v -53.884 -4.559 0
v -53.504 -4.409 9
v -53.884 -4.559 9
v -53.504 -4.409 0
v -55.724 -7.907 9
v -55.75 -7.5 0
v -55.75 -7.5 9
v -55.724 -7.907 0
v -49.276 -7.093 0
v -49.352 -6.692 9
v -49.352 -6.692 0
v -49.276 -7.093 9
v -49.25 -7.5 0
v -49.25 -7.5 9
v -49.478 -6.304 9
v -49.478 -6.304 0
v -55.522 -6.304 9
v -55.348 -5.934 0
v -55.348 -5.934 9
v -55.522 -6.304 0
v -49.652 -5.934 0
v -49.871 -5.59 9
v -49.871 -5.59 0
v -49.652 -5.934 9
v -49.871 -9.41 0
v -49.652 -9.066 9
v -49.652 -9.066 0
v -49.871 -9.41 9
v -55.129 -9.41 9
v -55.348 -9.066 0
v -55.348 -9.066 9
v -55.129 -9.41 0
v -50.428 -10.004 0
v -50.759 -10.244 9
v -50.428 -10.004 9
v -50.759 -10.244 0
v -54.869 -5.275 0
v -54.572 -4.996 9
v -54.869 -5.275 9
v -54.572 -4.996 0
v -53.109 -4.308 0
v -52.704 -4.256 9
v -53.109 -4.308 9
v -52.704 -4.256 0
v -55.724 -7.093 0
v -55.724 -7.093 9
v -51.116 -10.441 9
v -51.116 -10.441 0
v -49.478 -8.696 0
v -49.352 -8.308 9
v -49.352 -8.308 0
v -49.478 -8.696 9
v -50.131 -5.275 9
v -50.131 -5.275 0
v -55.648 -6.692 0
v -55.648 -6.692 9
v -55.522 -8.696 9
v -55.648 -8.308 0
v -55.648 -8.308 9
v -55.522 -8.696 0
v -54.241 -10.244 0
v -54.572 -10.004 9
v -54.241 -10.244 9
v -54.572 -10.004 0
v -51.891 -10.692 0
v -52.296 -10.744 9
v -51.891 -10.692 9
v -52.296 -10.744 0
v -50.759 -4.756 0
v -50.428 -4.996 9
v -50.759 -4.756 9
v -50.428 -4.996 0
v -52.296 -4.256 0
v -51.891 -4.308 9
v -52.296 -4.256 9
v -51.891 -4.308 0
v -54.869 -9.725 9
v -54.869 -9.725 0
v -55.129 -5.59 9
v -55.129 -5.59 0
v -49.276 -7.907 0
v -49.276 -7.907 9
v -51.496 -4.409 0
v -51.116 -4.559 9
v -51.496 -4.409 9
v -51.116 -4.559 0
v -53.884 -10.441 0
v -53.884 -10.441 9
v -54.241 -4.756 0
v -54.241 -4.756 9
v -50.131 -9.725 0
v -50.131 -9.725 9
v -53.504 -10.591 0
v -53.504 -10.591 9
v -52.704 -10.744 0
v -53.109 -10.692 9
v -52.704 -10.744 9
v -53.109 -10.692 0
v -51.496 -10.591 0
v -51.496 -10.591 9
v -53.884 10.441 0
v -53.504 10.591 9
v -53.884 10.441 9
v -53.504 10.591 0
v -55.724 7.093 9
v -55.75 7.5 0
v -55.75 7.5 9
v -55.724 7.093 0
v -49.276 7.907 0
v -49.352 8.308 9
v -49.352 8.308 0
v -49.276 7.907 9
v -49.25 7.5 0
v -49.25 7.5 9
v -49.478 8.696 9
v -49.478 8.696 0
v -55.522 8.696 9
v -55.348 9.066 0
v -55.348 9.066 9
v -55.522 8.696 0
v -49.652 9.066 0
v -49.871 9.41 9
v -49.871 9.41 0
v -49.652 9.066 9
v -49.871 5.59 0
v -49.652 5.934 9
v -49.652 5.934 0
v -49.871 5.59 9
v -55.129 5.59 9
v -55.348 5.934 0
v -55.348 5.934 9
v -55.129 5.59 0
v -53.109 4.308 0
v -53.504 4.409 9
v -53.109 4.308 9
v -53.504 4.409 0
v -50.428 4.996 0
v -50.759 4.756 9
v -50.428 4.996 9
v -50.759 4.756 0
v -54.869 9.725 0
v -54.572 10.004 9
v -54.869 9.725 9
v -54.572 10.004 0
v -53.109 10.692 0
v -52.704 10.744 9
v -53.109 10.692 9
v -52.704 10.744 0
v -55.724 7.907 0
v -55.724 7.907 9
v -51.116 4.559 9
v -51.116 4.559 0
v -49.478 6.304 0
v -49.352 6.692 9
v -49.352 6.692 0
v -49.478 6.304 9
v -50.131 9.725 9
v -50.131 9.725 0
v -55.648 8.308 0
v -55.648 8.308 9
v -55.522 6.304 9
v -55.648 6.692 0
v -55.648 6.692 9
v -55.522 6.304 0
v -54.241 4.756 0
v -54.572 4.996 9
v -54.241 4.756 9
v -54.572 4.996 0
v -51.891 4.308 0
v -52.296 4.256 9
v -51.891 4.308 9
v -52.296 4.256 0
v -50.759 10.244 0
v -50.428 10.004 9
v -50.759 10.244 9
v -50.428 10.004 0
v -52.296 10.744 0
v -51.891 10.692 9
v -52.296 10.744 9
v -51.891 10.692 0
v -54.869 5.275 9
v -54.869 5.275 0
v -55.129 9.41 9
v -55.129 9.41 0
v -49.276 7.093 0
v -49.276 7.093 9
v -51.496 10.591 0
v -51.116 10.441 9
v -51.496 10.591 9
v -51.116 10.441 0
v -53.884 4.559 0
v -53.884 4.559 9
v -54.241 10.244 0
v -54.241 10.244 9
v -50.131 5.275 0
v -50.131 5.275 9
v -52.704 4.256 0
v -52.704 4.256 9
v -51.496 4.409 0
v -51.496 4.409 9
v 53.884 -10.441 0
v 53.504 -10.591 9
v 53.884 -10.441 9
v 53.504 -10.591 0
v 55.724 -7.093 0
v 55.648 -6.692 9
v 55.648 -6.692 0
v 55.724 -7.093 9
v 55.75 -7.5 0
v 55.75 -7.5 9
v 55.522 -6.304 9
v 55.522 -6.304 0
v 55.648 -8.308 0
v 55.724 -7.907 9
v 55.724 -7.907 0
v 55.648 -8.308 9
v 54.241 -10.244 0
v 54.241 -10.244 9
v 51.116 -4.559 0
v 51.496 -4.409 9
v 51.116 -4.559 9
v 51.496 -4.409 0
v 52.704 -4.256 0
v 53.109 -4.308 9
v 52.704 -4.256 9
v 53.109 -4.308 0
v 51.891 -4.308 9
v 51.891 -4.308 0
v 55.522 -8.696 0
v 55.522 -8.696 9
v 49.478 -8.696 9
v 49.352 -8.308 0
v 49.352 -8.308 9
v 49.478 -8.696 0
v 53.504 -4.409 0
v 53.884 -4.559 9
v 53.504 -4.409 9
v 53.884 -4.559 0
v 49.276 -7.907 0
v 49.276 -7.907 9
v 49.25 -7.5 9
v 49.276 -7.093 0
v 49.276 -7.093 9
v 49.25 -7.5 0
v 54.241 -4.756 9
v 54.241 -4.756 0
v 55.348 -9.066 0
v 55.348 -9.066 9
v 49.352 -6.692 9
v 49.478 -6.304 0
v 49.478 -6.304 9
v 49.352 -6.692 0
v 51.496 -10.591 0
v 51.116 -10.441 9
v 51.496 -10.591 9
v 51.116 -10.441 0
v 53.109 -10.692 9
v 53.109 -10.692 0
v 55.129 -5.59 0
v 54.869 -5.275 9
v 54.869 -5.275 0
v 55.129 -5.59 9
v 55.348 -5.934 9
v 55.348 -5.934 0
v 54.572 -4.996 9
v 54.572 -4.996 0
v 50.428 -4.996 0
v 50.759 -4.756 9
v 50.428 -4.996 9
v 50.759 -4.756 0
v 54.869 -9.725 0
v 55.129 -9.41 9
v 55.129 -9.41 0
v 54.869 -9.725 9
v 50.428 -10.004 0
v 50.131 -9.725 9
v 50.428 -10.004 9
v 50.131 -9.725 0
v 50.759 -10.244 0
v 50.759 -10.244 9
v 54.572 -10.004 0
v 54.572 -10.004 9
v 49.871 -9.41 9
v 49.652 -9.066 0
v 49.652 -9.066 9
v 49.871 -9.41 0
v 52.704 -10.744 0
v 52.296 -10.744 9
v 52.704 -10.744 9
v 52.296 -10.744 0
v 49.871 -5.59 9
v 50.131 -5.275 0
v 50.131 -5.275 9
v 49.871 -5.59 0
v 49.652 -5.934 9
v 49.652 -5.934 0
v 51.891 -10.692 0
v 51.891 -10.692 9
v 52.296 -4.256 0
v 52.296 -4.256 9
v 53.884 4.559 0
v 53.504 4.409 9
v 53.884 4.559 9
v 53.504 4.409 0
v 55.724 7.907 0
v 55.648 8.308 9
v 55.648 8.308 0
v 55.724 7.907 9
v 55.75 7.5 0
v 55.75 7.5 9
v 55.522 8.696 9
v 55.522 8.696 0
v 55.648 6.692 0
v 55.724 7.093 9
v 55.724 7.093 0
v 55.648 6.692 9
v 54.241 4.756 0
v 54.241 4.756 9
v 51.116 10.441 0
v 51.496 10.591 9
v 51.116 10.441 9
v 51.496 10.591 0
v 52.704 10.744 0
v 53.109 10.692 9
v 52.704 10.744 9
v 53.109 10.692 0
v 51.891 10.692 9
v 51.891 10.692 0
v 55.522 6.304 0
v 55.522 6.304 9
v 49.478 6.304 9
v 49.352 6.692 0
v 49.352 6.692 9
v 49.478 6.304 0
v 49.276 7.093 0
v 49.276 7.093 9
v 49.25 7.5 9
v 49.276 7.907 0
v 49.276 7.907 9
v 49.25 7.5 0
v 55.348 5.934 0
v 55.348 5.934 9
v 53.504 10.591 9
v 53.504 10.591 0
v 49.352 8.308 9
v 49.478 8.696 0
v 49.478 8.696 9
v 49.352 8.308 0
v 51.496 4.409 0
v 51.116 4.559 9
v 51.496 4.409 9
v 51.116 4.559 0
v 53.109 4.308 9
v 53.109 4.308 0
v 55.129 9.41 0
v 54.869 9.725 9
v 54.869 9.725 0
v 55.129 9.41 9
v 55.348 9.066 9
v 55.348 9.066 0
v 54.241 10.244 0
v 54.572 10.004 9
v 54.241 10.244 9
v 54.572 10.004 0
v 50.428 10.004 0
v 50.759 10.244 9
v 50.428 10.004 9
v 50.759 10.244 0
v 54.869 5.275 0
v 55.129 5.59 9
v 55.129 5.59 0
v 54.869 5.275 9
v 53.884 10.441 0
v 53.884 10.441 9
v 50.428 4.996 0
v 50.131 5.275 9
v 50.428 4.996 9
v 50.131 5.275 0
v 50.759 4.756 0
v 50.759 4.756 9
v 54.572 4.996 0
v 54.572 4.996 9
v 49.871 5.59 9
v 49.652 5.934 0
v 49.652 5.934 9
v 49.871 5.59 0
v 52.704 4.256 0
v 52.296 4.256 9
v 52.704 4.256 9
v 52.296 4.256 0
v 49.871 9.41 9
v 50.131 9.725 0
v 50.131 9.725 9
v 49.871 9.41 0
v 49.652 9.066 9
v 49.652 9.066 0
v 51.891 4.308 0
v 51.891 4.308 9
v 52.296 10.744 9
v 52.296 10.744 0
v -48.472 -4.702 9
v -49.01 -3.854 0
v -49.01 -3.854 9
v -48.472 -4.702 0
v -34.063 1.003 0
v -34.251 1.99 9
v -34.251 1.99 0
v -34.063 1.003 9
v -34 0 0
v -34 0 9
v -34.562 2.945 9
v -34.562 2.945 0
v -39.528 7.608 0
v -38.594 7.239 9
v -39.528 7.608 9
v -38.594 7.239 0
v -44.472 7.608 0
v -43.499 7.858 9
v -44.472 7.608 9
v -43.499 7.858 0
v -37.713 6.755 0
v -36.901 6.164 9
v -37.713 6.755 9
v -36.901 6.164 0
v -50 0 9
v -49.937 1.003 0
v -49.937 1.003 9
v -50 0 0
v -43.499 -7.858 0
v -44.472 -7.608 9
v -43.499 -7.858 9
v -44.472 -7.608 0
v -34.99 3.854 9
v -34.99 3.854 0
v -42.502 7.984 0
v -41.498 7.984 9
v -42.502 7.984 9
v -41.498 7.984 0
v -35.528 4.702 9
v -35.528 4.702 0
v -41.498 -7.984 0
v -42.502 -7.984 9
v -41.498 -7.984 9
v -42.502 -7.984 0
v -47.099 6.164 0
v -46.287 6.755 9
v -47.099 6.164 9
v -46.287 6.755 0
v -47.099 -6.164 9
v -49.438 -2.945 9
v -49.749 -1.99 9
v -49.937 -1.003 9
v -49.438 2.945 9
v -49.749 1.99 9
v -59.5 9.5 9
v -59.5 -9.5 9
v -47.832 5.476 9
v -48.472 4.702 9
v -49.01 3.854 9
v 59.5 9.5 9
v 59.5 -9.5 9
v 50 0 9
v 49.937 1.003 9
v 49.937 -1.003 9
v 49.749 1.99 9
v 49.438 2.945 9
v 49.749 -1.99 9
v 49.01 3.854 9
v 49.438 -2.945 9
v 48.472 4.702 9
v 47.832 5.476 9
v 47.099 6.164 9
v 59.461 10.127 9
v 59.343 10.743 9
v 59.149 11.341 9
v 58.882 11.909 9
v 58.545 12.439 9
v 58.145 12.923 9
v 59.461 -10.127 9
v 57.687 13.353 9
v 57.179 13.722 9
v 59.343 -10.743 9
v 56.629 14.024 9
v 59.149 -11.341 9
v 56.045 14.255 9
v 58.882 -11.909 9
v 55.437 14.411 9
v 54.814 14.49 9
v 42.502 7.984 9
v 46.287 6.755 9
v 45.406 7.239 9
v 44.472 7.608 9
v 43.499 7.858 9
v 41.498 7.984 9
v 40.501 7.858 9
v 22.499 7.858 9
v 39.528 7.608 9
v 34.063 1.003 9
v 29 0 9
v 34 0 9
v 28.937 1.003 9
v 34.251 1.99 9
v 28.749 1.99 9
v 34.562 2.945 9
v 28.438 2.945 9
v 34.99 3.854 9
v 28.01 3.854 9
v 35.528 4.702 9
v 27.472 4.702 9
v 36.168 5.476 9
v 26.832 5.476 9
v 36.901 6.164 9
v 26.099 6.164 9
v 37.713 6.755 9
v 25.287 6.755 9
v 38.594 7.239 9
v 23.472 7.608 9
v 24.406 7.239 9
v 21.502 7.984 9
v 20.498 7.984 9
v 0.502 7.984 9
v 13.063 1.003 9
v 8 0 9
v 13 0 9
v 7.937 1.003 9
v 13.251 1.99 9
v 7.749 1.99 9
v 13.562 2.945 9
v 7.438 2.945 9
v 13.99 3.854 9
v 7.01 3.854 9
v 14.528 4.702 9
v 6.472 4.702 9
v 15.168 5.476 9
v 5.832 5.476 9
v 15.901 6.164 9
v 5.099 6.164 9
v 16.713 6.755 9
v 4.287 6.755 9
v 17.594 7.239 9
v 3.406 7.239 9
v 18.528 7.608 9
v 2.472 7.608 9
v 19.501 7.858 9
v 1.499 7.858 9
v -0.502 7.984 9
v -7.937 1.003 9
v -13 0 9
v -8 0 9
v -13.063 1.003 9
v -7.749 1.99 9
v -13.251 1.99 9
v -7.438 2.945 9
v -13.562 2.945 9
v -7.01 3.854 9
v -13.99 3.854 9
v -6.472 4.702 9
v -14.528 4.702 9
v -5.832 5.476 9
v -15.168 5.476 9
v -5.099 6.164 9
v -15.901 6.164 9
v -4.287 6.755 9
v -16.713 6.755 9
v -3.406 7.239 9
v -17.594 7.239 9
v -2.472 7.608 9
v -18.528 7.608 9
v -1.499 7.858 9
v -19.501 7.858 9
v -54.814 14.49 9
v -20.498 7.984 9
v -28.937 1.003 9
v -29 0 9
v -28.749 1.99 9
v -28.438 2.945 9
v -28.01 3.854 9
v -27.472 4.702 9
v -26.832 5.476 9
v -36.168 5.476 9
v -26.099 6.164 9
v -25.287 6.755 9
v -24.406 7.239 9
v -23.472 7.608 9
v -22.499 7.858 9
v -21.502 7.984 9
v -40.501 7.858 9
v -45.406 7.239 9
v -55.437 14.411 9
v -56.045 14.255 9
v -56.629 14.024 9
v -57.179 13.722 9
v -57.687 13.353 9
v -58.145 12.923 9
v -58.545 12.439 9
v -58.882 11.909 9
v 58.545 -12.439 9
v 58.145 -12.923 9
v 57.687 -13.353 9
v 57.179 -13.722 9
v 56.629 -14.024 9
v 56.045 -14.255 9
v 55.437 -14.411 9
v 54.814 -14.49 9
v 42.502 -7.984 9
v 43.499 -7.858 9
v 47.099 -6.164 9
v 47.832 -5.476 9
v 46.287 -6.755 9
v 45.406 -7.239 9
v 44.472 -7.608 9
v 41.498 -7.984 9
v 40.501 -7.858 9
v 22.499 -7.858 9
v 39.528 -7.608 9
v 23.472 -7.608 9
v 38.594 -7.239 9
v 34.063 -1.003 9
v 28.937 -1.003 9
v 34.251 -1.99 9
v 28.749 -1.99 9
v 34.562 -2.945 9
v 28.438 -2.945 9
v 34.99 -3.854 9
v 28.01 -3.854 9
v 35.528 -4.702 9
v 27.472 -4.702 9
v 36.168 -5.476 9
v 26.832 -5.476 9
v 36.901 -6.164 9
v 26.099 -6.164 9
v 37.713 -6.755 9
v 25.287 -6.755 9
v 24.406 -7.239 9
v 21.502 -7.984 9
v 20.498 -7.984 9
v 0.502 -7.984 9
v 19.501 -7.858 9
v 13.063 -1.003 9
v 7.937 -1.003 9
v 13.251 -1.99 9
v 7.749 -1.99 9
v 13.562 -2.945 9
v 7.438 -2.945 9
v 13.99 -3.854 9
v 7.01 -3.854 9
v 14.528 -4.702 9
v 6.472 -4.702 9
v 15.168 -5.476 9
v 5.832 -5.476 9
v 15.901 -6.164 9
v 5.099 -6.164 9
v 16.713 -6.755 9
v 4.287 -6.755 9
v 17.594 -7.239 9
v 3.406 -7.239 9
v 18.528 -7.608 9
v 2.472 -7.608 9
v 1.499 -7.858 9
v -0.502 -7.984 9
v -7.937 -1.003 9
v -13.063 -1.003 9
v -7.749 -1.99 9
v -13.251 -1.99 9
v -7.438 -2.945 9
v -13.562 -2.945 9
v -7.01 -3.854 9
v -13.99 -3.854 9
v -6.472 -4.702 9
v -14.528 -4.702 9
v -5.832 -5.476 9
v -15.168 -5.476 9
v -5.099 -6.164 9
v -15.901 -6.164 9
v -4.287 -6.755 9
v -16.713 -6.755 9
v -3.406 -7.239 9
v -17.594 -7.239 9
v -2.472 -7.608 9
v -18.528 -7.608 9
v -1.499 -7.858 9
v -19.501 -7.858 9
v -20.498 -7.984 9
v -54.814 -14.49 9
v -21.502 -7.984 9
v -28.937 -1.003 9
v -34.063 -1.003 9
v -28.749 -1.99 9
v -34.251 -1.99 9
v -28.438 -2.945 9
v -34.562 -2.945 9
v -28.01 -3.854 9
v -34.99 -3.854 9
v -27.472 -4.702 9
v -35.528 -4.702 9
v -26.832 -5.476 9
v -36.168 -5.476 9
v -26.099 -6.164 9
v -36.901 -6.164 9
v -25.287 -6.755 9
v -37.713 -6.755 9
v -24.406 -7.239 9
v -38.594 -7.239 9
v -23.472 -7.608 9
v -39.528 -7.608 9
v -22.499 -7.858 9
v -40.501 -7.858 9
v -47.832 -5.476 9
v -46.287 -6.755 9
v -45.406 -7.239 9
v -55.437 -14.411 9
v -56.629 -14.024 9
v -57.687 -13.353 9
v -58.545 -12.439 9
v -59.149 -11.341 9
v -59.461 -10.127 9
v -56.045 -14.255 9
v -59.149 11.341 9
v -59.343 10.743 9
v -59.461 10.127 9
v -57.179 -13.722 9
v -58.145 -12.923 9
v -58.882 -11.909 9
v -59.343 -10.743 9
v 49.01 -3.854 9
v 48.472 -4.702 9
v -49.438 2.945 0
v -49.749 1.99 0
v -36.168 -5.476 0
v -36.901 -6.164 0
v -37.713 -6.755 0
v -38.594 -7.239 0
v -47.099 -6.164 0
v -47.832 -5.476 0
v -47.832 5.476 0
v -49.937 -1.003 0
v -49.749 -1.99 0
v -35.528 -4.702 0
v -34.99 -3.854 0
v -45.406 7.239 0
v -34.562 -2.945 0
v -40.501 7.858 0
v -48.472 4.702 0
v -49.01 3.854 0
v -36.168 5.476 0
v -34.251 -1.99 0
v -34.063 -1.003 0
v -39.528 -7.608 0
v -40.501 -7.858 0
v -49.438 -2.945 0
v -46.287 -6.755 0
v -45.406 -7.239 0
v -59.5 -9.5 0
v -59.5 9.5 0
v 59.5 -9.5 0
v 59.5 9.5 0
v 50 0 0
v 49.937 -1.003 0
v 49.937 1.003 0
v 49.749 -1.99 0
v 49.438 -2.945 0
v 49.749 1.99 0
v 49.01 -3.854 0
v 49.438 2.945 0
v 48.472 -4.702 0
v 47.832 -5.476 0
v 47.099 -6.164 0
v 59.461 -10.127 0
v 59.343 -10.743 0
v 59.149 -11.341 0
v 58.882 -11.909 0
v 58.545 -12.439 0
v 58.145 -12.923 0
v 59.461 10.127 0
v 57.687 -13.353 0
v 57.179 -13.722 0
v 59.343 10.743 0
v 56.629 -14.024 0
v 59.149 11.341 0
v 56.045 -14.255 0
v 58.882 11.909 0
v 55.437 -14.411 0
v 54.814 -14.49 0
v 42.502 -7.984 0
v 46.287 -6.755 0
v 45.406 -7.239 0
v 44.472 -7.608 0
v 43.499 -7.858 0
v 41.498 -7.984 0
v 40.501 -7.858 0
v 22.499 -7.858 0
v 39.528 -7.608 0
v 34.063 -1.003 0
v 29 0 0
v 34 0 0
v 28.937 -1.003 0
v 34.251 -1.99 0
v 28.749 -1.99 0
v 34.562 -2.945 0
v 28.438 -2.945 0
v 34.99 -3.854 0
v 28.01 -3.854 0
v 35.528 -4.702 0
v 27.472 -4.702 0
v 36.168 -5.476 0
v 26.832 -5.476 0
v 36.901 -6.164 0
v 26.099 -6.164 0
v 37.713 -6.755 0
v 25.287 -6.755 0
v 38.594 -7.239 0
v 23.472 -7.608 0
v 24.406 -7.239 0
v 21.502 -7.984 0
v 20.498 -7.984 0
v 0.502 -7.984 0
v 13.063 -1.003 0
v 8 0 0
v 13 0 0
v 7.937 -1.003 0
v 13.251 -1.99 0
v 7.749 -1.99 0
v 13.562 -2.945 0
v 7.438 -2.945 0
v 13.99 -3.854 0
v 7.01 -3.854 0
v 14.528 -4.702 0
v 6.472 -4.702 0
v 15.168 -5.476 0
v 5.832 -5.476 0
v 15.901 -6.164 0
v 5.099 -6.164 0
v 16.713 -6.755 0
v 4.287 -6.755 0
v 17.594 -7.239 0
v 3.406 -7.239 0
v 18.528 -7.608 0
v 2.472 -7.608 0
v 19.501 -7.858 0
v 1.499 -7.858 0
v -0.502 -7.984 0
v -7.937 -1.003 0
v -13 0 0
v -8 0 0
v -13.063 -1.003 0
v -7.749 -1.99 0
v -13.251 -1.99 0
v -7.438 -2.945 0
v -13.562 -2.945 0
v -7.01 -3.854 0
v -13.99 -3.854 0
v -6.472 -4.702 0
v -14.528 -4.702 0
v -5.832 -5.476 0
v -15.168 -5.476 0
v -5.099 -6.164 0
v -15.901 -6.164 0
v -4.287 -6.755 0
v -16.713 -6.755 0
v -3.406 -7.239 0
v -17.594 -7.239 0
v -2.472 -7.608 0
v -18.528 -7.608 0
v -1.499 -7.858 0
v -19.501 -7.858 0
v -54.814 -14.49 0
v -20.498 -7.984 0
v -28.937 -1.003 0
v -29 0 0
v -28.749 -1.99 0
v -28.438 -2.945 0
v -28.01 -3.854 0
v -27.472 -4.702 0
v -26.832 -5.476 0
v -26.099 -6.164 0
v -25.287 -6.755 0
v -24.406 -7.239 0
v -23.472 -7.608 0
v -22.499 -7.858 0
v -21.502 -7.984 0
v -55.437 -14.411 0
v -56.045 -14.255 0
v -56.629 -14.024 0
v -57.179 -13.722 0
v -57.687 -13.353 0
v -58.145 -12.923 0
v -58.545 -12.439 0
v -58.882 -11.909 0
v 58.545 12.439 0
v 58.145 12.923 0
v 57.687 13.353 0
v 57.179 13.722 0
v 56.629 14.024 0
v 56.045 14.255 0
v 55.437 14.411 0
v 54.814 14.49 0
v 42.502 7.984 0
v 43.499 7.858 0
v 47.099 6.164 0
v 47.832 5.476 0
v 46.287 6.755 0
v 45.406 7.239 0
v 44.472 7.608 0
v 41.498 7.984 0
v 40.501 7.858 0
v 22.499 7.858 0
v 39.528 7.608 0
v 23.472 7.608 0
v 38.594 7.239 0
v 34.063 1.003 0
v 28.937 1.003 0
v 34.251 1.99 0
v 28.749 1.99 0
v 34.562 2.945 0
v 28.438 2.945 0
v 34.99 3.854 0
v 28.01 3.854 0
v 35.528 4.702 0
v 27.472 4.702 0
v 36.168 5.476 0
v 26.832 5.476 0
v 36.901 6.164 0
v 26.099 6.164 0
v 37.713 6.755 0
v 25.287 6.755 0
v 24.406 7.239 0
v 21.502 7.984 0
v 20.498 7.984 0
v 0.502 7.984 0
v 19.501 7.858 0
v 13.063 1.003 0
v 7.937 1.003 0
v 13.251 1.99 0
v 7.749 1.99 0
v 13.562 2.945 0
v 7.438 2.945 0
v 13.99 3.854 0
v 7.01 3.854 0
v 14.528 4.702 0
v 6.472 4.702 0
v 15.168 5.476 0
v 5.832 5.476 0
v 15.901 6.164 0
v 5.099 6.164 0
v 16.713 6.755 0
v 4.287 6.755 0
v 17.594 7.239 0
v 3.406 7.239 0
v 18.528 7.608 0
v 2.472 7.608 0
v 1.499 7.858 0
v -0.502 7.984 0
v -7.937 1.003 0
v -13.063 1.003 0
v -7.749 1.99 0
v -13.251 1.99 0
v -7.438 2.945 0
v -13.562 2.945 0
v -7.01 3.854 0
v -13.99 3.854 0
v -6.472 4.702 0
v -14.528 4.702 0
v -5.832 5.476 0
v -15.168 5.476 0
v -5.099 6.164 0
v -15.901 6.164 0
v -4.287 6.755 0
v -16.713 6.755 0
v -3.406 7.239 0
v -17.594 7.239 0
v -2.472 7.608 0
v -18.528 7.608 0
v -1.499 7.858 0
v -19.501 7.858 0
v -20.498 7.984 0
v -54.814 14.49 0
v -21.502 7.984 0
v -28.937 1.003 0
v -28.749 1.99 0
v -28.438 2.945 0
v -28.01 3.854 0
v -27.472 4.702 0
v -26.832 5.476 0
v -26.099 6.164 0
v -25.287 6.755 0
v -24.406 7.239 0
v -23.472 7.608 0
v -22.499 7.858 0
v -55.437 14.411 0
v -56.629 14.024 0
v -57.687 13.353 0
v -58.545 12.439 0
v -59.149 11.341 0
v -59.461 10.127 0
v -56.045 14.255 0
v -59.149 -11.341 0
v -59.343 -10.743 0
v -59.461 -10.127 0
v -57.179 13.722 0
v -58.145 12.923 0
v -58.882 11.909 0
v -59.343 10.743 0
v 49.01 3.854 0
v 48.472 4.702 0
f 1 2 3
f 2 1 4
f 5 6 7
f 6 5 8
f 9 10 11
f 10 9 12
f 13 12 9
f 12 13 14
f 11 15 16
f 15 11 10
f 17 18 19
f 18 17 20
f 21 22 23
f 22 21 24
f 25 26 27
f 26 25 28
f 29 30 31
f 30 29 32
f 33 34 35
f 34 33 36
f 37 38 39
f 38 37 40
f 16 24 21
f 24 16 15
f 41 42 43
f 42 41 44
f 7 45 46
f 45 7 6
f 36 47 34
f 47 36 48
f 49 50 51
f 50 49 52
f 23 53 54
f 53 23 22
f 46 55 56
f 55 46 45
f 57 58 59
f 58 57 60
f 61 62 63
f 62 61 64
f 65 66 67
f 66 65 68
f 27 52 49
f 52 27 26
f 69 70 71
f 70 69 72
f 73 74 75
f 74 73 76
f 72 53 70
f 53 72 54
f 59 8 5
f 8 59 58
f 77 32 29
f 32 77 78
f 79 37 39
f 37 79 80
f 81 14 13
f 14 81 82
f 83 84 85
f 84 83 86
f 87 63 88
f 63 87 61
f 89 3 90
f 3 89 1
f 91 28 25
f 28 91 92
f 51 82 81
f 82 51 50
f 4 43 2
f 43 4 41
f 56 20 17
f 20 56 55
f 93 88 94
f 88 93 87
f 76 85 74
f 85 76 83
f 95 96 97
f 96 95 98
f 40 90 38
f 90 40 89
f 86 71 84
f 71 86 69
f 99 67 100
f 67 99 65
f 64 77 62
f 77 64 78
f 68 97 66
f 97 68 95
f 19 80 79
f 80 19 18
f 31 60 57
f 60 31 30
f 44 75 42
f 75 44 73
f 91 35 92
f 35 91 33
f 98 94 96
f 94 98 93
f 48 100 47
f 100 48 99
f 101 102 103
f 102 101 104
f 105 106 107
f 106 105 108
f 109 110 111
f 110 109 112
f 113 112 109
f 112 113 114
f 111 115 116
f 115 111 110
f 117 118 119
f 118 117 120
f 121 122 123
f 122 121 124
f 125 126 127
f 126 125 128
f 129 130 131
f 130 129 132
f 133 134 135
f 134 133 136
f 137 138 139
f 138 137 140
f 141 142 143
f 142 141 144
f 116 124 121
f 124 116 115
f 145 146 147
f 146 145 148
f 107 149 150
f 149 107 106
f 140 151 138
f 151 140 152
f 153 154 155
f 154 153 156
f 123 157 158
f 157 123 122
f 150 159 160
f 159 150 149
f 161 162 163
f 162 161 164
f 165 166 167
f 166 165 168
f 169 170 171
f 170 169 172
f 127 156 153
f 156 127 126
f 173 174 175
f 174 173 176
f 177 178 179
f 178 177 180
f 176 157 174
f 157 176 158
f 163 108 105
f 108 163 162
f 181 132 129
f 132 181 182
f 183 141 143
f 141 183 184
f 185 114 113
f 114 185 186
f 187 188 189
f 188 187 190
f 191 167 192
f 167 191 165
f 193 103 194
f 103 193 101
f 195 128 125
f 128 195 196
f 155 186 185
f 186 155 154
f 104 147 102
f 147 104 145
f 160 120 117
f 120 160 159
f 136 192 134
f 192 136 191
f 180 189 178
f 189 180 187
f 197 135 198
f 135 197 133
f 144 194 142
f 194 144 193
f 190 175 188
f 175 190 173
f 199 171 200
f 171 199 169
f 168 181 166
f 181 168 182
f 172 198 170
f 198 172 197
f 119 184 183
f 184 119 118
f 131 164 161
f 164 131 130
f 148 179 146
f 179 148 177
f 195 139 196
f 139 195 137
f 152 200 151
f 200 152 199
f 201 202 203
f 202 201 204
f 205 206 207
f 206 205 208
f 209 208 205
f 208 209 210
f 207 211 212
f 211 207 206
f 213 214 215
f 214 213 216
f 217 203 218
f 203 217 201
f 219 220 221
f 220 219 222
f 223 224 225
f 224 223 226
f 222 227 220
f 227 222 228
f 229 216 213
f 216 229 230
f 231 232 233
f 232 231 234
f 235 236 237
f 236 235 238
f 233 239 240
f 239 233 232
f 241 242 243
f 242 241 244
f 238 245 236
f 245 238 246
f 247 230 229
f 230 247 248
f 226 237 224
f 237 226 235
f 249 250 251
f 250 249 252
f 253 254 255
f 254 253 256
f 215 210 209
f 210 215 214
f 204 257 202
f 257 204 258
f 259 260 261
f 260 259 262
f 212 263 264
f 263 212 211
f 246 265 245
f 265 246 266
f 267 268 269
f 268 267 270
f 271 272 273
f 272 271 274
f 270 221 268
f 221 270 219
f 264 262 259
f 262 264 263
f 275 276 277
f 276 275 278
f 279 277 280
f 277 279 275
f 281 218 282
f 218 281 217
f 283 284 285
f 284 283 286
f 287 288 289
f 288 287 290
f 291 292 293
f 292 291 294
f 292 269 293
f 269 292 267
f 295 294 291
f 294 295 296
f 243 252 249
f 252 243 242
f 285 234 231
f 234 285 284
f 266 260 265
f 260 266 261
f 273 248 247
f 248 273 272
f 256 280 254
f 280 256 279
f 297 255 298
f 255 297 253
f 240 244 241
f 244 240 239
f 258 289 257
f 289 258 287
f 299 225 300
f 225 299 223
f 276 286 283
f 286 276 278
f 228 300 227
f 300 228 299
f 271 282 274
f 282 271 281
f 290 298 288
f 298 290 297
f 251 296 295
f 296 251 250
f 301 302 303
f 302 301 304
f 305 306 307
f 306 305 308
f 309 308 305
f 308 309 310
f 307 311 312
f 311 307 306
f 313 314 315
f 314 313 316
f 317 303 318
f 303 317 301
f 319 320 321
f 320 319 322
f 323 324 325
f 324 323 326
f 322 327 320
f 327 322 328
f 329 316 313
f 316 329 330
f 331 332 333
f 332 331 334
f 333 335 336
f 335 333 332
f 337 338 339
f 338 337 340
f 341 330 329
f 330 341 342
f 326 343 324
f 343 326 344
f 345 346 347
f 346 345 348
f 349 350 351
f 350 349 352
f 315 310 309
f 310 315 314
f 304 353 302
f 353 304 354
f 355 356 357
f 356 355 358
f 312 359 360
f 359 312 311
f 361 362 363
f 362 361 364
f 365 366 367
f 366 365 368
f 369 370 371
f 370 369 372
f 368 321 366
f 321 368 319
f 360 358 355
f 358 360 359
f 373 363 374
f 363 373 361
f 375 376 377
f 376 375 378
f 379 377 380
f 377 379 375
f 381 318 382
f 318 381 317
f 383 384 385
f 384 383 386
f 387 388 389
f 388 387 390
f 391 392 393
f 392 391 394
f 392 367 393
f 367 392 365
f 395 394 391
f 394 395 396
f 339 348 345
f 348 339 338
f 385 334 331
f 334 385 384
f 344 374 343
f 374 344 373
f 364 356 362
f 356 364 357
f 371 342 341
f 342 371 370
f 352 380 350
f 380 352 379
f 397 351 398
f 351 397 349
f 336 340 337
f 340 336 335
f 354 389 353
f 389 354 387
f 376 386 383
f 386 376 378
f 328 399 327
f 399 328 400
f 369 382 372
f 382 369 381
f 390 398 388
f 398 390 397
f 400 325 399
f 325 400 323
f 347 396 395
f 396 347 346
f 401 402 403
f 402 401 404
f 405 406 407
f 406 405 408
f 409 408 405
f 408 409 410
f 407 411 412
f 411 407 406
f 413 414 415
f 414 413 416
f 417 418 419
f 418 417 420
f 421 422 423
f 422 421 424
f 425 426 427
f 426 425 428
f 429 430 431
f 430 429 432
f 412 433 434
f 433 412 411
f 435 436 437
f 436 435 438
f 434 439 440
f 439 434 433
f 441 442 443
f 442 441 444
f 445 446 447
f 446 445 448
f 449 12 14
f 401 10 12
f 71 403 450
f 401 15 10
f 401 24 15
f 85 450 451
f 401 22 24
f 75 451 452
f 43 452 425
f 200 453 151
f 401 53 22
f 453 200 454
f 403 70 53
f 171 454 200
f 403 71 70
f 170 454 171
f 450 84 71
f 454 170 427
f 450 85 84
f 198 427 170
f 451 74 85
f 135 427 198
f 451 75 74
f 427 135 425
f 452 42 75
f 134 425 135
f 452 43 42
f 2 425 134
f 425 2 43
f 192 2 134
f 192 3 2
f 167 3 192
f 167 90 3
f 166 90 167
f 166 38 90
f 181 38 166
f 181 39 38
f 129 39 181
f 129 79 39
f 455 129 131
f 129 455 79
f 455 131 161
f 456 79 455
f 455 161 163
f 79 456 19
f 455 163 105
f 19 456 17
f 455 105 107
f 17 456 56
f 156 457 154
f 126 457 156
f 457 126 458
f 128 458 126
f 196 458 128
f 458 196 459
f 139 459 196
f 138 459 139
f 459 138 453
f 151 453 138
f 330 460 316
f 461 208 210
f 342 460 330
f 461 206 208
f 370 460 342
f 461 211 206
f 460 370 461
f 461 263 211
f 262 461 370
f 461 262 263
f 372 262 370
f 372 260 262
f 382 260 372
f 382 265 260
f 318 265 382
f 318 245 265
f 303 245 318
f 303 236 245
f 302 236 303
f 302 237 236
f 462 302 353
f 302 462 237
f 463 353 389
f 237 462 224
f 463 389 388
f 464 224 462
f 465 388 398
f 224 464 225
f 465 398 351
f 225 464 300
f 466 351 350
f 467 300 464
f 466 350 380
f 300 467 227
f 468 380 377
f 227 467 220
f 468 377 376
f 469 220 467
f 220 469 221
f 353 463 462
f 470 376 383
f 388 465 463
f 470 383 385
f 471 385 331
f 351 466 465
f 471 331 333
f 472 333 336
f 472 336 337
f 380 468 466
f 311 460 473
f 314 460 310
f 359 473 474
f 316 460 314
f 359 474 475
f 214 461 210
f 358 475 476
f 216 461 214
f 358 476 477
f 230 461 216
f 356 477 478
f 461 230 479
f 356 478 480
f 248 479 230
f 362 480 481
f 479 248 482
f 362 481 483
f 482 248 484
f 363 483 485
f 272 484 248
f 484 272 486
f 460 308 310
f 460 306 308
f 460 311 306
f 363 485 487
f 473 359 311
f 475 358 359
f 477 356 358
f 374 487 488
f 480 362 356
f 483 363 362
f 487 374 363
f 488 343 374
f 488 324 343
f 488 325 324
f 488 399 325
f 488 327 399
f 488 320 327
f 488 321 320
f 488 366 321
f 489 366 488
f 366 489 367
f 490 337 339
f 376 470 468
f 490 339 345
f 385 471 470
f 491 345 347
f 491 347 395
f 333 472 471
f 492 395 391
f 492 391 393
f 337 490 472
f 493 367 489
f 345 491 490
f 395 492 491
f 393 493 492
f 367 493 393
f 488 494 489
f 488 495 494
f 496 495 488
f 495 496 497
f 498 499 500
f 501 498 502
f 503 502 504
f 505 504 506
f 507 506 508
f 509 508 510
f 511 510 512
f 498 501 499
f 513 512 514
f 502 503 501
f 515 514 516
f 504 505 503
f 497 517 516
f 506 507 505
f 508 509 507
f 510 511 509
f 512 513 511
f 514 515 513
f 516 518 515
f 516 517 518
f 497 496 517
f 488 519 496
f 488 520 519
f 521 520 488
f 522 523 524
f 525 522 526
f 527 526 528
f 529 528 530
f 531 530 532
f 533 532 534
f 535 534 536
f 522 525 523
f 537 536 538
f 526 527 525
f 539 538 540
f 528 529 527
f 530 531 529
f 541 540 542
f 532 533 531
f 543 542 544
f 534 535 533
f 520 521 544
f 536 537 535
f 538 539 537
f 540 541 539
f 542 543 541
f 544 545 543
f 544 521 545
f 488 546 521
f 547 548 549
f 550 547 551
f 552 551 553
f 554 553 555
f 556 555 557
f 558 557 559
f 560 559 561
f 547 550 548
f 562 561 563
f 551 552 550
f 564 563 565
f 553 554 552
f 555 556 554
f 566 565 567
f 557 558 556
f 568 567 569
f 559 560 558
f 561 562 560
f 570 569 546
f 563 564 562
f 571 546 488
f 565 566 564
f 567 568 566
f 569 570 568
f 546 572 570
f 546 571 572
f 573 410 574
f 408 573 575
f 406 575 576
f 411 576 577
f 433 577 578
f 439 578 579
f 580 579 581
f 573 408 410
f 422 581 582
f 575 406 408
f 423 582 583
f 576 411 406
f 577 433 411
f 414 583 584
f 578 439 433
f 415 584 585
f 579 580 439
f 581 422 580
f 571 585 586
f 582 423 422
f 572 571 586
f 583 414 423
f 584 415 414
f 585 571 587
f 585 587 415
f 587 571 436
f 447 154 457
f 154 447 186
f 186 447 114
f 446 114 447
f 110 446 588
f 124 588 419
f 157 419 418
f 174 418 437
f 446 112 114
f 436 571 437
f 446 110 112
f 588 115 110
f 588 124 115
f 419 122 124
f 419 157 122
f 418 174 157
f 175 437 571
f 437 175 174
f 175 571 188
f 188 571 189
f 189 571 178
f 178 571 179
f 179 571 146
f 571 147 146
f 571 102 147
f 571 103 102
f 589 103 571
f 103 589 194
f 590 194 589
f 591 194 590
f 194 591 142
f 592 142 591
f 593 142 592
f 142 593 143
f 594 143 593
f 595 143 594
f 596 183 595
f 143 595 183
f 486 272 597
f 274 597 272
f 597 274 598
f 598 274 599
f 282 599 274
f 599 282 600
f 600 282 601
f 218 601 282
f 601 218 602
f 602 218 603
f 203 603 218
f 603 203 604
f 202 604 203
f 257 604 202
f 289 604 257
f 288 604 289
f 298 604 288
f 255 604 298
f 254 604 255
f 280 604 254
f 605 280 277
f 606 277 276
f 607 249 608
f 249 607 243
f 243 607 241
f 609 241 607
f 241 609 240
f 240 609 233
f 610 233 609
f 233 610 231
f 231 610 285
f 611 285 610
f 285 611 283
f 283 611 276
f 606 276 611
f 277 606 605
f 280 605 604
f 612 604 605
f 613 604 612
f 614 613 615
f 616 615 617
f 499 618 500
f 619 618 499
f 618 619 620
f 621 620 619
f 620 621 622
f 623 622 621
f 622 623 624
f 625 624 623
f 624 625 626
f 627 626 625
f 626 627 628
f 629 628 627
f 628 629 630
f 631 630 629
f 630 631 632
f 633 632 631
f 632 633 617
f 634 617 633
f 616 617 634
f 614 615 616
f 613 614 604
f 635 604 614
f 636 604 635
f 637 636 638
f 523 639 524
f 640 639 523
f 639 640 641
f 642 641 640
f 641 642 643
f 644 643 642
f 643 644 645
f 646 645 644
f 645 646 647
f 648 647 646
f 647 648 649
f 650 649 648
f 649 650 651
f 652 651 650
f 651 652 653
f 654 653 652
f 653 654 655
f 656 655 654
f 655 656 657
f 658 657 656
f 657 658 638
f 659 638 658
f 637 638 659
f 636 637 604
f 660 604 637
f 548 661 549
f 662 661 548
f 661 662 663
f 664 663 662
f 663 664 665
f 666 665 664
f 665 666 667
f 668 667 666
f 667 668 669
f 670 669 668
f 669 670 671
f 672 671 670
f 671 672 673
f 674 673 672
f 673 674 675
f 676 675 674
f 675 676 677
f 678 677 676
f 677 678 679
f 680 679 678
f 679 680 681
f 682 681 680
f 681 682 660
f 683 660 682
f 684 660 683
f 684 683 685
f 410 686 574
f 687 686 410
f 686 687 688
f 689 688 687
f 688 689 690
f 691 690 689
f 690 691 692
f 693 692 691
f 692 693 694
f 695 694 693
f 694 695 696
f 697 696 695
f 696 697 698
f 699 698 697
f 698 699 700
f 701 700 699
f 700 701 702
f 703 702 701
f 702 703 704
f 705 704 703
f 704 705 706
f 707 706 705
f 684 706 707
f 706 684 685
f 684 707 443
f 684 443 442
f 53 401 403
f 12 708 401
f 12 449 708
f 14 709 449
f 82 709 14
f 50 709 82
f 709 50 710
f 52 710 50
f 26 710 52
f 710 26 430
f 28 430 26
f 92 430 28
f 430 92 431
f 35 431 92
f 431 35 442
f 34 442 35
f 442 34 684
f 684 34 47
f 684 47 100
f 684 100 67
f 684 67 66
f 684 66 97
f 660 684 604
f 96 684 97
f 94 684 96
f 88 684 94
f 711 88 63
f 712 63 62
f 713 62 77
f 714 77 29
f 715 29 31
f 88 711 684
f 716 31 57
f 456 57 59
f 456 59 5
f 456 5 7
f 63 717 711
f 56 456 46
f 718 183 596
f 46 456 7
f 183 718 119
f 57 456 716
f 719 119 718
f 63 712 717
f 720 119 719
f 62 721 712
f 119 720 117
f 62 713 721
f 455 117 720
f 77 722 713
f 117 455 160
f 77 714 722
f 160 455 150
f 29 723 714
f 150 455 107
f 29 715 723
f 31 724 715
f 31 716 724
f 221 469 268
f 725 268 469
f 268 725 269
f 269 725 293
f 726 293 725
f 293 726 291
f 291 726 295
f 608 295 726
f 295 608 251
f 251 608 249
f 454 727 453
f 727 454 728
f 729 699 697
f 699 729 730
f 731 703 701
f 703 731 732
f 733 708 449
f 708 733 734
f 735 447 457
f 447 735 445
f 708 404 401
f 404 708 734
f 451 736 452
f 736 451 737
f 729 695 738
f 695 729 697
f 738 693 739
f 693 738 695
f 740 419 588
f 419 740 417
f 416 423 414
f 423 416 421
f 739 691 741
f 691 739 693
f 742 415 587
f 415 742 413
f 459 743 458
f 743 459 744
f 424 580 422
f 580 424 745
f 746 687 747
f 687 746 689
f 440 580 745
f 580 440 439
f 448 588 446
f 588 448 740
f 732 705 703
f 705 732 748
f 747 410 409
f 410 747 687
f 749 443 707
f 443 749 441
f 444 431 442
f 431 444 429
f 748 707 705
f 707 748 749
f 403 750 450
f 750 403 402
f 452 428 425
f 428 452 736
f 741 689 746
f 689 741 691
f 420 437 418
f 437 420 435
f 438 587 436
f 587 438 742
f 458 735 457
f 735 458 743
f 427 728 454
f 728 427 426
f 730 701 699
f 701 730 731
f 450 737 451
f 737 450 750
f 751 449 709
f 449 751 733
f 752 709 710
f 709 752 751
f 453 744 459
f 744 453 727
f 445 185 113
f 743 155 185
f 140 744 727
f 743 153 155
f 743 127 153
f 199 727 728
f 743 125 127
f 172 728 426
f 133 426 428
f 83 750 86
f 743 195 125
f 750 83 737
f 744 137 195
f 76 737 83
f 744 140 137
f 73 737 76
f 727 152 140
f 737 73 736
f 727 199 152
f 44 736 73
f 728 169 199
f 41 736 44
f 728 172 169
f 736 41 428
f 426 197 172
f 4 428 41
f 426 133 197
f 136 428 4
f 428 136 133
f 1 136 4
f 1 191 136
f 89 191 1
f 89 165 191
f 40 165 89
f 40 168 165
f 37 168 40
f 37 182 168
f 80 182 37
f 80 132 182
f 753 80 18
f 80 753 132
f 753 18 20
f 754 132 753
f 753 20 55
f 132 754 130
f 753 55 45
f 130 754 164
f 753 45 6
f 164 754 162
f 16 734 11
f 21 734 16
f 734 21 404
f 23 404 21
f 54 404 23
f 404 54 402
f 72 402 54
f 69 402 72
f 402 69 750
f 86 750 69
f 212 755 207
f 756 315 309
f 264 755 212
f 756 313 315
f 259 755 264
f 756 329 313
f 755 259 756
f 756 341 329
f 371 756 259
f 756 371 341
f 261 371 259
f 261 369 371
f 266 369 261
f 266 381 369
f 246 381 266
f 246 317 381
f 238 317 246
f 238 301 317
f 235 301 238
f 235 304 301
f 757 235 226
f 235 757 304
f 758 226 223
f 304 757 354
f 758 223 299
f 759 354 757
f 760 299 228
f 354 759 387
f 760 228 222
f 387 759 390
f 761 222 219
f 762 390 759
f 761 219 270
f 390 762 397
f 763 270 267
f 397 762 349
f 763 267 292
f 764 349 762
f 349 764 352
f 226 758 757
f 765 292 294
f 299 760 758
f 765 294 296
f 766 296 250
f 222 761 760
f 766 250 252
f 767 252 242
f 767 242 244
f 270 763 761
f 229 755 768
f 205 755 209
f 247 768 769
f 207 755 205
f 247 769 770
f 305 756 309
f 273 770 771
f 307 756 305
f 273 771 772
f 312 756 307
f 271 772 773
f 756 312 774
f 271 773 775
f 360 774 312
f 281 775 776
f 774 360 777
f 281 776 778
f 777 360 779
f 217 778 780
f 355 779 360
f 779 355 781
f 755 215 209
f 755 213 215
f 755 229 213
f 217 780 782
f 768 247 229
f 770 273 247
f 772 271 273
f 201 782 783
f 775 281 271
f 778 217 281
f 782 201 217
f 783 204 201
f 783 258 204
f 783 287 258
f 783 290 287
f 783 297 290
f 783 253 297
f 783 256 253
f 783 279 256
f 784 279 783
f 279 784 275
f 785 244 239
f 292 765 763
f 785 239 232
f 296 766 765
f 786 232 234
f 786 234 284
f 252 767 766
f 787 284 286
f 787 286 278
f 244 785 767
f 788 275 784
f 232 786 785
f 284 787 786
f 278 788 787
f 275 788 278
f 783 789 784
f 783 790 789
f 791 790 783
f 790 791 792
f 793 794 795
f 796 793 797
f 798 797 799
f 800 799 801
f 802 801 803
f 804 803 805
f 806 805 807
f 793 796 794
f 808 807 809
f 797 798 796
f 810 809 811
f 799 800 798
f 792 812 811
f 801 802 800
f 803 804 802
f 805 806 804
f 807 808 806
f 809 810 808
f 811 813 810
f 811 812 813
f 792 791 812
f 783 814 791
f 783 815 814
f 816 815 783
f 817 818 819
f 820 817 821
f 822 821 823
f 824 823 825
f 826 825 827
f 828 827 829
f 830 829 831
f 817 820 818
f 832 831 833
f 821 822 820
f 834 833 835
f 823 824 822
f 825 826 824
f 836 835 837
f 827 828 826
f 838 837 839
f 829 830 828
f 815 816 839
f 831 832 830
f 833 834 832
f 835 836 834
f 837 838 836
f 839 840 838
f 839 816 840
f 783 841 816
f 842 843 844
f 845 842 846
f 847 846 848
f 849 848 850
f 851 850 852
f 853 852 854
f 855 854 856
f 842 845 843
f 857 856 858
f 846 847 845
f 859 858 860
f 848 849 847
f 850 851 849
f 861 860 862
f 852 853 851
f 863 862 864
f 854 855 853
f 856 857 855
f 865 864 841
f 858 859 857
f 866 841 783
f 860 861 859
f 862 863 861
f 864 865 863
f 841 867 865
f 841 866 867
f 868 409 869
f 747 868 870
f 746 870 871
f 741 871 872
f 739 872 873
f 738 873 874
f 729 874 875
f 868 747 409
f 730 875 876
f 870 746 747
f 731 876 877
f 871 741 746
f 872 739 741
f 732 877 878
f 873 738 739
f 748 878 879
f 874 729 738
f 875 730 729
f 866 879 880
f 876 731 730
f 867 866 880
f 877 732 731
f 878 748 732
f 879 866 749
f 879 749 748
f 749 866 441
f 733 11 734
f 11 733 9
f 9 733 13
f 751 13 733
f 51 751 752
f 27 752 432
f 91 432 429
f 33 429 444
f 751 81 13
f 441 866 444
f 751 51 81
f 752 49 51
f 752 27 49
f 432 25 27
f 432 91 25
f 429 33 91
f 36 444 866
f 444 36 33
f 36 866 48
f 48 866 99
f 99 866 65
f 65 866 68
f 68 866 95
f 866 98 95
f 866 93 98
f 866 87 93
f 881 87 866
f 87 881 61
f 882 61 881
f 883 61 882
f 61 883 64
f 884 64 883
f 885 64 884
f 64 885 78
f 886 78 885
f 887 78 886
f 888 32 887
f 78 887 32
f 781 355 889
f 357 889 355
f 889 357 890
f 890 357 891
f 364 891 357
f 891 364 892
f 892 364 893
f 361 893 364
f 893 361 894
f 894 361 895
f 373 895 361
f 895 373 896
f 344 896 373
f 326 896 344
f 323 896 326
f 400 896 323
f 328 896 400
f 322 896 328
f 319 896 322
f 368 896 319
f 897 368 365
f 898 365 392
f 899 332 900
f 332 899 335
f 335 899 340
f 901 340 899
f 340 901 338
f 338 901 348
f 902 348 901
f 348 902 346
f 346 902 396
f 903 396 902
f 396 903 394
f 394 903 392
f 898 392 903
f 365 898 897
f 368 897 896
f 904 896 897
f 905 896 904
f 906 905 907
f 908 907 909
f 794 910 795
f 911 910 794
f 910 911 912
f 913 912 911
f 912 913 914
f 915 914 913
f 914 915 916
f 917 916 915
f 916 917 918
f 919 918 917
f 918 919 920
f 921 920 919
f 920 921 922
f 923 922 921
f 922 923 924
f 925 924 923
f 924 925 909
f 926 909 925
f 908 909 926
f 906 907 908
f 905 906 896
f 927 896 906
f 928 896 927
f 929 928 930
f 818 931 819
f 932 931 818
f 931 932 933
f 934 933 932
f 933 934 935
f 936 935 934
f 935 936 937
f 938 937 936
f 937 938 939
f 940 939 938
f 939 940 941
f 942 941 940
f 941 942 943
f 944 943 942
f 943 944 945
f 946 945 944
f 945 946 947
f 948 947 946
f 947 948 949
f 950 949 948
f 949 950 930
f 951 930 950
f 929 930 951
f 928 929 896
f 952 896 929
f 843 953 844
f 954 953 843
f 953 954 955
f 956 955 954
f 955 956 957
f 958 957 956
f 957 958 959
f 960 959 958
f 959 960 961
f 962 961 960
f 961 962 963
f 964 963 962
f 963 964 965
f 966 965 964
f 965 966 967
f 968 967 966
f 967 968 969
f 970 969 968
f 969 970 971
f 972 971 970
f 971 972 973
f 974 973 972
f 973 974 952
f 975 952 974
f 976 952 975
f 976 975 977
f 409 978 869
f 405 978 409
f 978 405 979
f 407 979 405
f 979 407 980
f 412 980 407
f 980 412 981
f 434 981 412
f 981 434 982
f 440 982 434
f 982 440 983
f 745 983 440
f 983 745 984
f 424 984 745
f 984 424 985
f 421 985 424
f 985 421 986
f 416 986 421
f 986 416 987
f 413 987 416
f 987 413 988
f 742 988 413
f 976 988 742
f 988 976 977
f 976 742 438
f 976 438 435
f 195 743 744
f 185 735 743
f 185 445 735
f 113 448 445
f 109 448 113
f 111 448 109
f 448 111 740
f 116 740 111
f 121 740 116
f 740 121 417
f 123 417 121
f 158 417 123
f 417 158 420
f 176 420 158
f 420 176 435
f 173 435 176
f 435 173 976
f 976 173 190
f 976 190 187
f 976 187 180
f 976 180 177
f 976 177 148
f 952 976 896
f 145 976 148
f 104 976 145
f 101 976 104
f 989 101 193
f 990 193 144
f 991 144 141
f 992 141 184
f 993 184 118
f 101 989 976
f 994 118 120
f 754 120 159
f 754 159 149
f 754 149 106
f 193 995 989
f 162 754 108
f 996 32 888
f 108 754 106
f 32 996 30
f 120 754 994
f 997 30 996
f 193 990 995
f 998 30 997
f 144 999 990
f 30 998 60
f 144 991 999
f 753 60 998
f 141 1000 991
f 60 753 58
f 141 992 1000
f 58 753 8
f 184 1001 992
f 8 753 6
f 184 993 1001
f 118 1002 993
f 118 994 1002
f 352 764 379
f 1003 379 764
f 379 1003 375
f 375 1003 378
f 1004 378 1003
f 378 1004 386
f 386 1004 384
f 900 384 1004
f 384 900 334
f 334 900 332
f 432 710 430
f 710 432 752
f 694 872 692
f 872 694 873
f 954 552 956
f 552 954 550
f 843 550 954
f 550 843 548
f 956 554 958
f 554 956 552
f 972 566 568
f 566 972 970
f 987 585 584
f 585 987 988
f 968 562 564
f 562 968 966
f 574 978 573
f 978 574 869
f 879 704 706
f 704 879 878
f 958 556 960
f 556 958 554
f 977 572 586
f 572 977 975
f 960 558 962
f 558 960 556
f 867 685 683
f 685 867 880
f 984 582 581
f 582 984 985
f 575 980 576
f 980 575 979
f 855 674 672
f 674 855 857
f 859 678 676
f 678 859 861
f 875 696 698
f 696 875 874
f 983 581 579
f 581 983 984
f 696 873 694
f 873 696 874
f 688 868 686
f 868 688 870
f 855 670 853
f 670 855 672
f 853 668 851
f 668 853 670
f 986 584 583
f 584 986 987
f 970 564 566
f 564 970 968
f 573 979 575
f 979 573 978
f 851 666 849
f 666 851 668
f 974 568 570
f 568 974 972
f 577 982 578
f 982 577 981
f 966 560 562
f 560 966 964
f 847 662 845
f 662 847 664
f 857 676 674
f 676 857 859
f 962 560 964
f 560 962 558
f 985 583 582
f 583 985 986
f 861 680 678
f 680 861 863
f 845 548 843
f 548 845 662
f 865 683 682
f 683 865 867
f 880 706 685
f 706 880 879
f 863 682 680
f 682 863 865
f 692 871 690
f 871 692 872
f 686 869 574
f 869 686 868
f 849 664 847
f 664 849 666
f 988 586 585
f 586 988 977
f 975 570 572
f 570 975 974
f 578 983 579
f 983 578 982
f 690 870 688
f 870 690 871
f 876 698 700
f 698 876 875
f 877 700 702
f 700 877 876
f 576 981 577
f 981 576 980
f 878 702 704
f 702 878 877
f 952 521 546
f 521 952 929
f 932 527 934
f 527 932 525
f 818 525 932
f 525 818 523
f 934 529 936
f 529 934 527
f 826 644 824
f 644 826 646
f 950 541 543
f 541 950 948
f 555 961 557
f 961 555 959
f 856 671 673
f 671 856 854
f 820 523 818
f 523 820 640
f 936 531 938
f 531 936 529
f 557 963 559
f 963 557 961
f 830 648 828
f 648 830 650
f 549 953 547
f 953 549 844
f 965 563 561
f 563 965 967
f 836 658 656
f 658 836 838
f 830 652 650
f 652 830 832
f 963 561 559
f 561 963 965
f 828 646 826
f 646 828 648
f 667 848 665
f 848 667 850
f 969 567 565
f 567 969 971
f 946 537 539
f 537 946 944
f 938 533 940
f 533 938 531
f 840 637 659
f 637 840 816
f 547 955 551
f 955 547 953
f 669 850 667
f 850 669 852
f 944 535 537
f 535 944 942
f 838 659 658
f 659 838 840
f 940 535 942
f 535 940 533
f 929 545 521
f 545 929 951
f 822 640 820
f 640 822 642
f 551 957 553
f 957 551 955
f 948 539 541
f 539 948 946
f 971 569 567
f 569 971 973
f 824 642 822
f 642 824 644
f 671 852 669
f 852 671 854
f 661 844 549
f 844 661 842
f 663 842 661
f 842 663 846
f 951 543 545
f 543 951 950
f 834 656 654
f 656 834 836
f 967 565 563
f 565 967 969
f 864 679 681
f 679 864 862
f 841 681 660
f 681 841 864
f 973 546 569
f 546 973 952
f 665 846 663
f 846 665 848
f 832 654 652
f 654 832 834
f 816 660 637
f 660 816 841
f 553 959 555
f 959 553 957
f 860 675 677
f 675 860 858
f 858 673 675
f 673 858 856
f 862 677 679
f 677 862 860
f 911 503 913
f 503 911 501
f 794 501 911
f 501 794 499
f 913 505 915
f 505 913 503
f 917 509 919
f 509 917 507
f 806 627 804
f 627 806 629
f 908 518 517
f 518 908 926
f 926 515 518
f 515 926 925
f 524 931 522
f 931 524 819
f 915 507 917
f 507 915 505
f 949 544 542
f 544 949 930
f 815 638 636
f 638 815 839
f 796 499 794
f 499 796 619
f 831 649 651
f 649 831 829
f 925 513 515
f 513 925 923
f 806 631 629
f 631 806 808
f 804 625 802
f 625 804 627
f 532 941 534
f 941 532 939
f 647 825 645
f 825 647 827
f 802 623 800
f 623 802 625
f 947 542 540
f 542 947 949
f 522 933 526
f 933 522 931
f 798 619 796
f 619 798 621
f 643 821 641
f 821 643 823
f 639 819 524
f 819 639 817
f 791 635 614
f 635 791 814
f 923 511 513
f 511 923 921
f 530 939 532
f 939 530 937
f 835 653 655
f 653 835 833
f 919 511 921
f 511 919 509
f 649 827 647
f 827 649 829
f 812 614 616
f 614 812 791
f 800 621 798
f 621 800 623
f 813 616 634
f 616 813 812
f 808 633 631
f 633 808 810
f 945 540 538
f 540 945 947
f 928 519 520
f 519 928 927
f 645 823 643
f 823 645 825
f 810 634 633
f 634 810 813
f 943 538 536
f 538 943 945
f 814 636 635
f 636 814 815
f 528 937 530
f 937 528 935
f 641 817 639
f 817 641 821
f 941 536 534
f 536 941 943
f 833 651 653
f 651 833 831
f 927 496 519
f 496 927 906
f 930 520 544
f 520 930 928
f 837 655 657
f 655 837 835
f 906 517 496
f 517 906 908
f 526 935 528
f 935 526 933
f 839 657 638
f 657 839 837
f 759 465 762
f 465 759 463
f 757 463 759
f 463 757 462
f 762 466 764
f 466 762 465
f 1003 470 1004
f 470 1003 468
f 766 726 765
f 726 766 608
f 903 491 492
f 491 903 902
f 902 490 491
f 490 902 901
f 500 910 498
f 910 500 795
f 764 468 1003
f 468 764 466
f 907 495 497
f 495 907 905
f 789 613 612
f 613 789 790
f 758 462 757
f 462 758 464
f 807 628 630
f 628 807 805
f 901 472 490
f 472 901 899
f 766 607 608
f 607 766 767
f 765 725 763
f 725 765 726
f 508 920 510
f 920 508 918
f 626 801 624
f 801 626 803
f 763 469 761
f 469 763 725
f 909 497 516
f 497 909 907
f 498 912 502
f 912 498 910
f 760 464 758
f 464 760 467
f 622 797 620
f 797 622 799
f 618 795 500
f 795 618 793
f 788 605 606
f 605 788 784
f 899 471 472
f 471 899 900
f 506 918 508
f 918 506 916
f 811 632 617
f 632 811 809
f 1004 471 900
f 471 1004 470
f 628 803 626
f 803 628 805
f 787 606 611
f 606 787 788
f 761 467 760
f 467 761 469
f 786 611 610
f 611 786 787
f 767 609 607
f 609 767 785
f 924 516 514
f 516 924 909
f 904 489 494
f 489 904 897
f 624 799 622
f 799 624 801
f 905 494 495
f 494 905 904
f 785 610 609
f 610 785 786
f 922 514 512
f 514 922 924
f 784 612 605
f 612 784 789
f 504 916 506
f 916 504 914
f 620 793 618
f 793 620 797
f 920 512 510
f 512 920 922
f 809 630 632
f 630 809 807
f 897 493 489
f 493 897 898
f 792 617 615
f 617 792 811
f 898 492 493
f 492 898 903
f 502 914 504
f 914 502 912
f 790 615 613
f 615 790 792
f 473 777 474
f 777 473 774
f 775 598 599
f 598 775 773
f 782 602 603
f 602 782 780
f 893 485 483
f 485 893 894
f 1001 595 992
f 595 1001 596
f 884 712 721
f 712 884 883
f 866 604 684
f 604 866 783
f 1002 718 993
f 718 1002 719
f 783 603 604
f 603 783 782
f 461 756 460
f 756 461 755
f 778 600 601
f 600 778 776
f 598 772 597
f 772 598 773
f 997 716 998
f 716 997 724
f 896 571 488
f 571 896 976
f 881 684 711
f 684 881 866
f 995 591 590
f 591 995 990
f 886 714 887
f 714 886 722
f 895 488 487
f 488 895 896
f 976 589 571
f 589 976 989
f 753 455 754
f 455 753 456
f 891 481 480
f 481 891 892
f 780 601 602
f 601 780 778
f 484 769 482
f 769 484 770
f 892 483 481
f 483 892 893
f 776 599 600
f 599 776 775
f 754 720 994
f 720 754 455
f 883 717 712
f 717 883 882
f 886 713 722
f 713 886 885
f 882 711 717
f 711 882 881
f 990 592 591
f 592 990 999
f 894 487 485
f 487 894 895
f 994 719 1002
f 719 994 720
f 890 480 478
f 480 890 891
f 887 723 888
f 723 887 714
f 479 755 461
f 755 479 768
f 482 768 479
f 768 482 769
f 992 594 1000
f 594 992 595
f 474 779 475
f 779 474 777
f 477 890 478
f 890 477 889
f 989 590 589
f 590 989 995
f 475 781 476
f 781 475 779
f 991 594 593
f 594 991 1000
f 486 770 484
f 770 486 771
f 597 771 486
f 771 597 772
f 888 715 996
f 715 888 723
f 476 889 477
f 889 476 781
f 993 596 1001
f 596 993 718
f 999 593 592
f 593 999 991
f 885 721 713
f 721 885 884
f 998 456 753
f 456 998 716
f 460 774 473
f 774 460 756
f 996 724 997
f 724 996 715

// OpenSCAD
$fn = 50;

difference() {
	union() {
		hull() {
			translate(v = [-54.5, 9.5, 0]) {
				cylinder(h = 9, r = 5);
			}
			translate(v = [54.5, 9.5, 0]) {
				cylinder(h = 9, r = 5);
			}
			translate(v = [-54.5, -9.5, 0]) {
				cylinder(h = 9, r = 5);
			}
			translate(v = [54.5, -9.5, 0]) {
				cylinder(h = 9, r = 5);
			}
		}
	}
	union() {
		translate(v = [-52.5, -7.5, -100.0]) {
			cylinder(h = 200, r = 3.25);
		}
		translate(v = [-52.5, 7.5, -100.0]) {
			cylinder(h = 200, r = 3.25);
		}
		translate(v = [52.5, -7.5, -100.0]) {
			cylinder(h = 200, r = 3.25);
		}
		translate(v = [52.5, 7.5, -100.0]) {
			cylinder(h = 200, r = 3.25);
		}
		translate(v = [-52.5, -7.5, -100.0]) {
			cylinder(h = 200, r = 1.8);
		}
		translate(v = [-52.5, 7.5, -100.0]) {
			cylinder(h = 200, r = 1.8);
		}
		translate(v = [52.5, -7.5, -100.0]) {
			cylinder(h = 200, r = 1.8);
		}
		translate(v = [52.5, 7.5, -100.0]) {
			cylinder(h = 200, r = 1.8);
		}
		translate(v = [-42.0, 0, 0.0]) {
			cylinder(h = 9, r = 8.0);
		}
		translate(v = [-21.0, 0, 0.0]) {
			cylinder(h = 9, r = 8.0);
		}
		cylinder(h = 9, r = 8.0);
		translate(v = [21.0, 0, 0.0]) {
			cylinder(h = 9, r = 8.0);
		}
		translate(v = [42.0, 0, 0.0]) {
			cylinder(h = 9, r = 8.0);
		}
	}
}
